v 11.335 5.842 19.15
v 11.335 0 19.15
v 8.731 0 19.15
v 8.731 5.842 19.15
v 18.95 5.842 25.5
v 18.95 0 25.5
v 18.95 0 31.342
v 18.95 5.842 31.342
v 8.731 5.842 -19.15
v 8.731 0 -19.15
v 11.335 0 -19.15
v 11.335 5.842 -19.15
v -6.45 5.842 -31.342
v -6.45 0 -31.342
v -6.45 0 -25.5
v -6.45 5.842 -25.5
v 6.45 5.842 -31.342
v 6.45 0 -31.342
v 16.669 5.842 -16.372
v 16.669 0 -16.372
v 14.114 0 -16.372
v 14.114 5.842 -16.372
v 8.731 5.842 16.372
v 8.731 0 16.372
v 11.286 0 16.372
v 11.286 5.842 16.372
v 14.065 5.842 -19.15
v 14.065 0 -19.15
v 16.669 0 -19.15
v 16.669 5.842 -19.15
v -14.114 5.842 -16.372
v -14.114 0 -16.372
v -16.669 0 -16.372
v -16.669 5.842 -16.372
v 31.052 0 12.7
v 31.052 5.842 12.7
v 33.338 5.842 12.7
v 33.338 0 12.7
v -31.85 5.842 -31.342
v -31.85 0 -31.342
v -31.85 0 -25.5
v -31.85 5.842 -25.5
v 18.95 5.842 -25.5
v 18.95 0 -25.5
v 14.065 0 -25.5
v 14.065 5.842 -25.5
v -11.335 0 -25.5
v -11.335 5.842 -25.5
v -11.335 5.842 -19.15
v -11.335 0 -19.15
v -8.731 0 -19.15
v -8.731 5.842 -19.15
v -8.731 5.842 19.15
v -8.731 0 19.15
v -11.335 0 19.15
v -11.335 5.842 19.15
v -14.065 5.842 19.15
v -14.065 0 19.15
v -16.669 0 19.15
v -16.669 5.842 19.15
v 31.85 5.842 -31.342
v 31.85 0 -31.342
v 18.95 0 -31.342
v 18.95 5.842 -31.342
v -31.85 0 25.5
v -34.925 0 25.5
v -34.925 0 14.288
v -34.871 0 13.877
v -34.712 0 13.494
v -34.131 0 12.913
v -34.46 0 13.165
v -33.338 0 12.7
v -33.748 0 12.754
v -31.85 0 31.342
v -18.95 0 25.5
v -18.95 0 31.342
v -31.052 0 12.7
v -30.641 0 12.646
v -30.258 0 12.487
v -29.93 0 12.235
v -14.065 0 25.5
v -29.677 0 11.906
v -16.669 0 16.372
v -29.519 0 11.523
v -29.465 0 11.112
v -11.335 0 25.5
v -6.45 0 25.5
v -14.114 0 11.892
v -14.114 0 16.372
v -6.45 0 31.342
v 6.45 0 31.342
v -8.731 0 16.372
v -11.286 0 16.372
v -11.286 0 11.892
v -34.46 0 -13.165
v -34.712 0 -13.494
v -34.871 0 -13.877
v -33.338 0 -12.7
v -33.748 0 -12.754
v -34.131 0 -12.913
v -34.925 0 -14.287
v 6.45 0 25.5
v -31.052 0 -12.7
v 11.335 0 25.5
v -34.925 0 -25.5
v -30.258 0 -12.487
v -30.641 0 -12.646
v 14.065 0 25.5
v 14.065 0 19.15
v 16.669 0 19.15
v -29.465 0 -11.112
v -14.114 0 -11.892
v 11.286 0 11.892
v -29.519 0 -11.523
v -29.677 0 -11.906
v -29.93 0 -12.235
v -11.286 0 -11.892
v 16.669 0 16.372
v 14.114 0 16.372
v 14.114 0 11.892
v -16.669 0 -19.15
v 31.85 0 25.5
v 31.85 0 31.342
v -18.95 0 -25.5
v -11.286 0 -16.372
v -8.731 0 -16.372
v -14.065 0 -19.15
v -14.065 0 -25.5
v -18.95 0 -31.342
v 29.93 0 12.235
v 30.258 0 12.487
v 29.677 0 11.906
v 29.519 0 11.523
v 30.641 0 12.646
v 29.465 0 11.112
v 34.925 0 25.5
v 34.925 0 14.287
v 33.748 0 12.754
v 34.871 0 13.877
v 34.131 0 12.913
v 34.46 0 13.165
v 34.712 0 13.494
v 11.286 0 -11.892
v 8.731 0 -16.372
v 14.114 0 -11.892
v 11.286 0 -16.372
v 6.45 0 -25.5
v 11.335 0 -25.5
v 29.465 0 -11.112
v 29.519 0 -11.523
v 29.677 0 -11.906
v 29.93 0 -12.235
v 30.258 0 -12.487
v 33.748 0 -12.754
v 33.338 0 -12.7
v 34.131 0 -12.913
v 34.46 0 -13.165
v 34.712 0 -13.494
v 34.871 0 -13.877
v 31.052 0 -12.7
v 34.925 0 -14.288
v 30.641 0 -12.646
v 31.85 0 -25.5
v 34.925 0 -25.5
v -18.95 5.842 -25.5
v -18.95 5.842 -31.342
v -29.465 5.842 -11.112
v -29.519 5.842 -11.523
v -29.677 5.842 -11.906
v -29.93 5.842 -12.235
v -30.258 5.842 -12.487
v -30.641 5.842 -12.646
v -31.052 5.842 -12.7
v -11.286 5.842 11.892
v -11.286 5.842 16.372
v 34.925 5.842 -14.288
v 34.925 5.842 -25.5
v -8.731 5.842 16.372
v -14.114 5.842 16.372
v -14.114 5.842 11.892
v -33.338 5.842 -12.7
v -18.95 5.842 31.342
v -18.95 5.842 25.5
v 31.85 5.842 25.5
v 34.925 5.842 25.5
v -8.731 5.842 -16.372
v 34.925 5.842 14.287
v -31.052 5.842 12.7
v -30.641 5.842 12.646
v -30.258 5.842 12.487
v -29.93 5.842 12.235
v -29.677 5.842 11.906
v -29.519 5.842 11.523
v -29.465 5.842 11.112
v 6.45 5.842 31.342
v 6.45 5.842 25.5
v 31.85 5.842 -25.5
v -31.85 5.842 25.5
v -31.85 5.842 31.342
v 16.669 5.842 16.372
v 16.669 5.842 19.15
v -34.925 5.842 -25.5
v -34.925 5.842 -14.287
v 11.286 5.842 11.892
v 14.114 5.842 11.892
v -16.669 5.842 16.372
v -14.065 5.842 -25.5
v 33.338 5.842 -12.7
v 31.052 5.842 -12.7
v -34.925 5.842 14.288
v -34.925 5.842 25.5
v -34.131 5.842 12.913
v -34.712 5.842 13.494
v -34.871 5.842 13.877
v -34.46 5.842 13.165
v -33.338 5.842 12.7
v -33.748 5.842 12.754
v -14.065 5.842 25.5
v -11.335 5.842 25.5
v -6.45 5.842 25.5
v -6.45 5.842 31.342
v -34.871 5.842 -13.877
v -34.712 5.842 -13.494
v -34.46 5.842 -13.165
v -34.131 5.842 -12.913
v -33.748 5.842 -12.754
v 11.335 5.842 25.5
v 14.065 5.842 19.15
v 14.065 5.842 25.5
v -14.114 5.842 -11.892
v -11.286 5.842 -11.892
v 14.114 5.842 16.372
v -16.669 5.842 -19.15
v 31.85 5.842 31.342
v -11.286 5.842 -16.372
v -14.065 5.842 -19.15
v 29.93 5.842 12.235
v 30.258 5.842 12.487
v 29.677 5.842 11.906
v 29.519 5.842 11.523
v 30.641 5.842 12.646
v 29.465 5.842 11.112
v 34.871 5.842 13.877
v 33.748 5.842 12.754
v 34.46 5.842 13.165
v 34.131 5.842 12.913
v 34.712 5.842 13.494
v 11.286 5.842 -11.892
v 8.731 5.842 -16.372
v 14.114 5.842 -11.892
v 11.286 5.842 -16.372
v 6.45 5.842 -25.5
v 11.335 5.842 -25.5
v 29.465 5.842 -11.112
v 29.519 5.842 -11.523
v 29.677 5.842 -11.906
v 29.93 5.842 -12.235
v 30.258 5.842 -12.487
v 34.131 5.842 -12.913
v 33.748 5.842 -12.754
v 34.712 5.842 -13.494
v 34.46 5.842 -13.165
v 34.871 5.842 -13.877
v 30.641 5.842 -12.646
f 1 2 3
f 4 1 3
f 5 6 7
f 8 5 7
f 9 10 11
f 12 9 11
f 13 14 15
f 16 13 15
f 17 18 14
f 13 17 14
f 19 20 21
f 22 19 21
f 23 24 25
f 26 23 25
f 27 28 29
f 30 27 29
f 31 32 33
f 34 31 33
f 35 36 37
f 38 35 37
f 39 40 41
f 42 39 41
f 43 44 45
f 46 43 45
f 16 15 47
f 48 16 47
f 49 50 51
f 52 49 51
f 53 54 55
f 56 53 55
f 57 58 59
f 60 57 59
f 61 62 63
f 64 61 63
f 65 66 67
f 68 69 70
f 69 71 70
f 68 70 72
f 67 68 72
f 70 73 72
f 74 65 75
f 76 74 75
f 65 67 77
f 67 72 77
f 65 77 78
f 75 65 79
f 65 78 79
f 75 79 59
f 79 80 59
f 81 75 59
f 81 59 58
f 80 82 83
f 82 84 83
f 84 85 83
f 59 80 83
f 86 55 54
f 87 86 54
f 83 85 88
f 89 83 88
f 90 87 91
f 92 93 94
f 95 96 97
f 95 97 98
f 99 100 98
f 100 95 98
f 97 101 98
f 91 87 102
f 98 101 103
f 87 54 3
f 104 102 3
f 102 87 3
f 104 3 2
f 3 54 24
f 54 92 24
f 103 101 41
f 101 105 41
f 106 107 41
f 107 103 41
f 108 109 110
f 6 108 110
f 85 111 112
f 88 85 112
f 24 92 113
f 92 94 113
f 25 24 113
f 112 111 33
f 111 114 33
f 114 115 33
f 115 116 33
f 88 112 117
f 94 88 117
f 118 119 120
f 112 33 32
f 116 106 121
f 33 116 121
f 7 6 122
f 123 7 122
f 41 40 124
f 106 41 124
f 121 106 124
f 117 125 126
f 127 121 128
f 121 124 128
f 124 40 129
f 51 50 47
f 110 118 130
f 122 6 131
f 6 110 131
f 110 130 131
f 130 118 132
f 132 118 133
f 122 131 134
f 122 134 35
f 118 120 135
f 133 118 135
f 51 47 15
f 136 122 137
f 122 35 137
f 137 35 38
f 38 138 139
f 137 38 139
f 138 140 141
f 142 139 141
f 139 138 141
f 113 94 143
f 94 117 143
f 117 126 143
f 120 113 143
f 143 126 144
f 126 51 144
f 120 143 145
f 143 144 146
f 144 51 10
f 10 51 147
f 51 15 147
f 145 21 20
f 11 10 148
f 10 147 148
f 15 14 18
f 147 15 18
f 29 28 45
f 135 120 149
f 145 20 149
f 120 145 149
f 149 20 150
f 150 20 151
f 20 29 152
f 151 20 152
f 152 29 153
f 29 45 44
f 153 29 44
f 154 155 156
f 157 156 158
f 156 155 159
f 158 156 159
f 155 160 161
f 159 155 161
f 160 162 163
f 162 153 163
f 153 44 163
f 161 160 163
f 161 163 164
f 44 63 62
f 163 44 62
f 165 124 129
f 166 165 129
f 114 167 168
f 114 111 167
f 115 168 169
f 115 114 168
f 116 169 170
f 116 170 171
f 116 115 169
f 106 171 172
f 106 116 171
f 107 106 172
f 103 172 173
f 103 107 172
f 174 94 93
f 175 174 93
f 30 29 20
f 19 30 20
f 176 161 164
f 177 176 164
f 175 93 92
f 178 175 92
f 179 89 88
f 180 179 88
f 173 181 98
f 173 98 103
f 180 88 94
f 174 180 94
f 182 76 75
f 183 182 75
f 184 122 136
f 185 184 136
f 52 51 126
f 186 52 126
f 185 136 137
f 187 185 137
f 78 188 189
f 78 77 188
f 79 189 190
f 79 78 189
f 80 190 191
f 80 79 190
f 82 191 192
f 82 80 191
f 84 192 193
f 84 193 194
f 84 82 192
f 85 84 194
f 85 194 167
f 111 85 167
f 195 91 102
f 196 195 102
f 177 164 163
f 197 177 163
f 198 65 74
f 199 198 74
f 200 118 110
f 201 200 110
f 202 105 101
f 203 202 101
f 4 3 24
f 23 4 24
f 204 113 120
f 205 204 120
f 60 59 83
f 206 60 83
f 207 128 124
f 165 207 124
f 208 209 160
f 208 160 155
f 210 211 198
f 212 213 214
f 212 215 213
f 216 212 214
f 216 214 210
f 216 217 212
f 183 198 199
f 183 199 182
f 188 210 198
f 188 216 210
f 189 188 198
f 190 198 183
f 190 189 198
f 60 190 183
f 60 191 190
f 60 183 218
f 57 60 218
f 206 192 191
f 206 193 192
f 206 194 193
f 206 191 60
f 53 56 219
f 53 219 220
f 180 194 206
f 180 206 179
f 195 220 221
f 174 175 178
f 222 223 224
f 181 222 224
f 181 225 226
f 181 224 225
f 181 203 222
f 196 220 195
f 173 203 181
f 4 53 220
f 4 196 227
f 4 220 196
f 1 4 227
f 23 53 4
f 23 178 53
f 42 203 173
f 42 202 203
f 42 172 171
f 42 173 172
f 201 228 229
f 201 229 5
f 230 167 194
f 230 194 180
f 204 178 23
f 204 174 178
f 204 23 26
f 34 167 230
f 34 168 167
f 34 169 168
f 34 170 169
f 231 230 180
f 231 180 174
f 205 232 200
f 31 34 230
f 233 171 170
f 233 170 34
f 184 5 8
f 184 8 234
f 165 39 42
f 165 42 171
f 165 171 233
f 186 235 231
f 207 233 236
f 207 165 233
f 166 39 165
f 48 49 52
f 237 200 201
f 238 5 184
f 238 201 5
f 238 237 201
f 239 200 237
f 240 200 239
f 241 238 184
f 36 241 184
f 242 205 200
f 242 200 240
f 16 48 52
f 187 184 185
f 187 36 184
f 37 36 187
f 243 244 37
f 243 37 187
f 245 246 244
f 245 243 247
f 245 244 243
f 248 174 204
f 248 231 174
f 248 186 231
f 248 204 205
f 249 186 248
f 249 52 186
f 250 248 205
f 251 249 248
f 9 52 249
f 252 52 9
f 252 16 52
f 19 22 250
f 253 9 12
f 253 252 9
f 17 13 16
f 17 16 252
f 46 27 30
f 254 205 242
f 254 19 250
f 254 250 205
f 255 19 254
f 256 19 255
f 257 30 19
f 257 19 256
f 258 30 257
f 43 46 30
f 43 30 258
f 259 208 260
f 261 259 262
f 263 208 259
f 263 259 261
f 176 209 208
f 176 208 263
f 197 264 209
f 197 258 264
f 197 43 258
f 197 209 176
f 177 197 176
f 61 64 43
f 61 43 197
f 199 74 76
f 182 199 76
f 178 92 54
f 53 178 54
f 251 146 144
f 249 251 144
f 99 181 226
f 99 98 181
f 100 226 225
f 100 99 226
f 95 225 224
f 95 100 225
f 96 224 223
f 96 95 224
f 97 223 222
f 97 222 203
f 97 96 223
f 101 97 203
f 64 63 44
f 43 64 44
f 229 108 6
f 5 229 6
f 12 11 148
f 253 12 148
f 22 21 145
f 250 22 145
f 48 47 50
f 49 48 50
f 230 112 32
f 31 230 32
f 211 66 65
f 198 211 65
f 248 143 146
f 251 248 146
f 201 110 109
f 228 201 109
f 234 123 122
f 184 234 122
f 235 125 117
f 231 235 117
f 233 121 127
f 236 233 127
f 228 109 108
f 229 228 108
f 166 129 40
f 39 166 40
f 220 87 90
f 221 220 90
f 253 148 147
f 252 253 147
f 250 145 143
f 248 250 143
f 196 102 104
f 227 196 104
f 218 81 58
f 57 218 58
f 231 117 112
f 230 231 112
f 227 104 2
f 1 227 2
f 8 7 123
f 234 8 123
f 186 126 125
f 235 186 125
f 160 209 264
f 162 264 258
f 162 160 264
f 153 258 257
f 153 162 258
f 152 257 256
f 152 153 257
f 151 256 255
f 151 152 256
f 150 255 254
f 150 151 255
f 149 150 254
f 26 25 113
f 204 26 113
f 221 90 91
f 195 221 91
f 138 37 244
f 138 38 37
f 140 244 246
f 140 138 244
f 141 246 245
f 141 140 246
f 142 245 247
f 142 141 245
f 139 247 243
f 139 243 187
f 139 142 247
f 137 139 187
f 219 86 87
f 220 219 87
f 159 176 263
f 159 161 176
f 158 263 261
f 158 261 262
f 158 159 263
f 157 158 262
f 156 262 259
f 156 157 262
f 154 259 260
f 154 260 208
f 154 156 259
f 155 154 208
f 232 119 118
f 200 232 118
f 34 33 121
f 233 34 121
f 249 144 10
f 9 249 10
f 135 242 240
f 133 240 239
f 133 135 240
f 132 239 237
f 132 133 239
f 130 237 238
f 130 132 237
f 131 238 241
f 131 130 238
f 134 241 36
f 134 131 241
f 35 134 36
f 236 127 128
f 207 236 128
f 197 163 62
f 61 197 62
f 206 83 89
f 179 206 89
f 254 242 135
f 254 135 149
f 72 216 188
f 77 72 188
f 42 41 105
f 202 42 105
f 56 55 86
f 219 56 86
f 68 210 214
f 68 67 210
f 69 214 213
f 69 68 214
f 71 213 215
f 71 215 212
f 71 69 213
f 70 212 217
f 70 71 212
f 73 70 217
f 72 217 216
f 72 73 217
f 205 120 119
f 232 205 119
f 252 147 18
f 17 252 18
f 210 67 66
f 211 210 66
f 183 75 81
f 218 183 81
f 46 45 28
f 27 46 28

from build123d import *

# Parameters (mm, degrees)
BOSS_EXTRUDE1_DEPTH = 5.842
SKETCH2_W           = 5.460302537
SKETCH2_H           = 25.4
CUT_EXTRUDE1_DEPTH  = 48.288535112
FILLET2_R           = 1.5875


with BuildPart() as part:
    # Sketch1 → Boss-Extrude1 (new body)
    with BuildSketch(Plane(origin=(0, 0, 0), x_dir=(1, 0, 0), z_dir=(0, 1, 0))):
        Polygon((-6.45, 31.342), (-6.45, 25.5), (-11.335313542, 25.5), (-11.335313542, 19.15), (-8.73125, 19.15), (-8.73125, 16.371875), (-11.286067573, 16.371875), (-11.286067573, 11.892), (-14.113932427, 11.892), (-14.113932427, 16.371875), (-16.66875, 16.371875), (-16.66875, 19.15), (-14.064686458, 19.15), (-14.064686458, 25.5), (-18.95, 25.5), (-18.95, 31.342), (-31.85, 31.342), (-31.85, 25.5), (-34.925, 25.5), (-34.925, -25.5), (-31.85, -25.5), (-31.85, -31.342), (-18.95, -31.342), (-18.95, -25.5), (-14.064686458, -25.5), (-14.064686458, -19.15), (-16.66875, -19.15), (-16.66875, -16.371875), (-14.113932427, -16.371875), (-14.113932427, -11.892), (-11.286067573, -11.892), (-11.286067573, -16.371875), (-8.73125, -16.371875), (-8.73125, -19.15), (-11.335313542, -19.15), (-11.335313542, -25.5), (-6.45, -25.5), (-6.45, -31.342), (6.45, -31.342), (6.45, -25.5), (11.335313542, -25.5), (11.335313542, -19.15), (8.73125, -19.15), (8.73125, -16.371875), (11.286067573, -16.371875), (11.286067573, -11.892), (14.113932427, -11.892), (14.113932427, -16.371875), (16.66875, -16.371875), (16.66875, -19.15), (14.064686458, -19.15), (14.064686458, -25.5), (18.95, -25.5), (18.95, -31.342), (31.85, -31.342), (31.85, -25.5), (34.925, -25.5), (34.925, 25.5), (31.85, 25.5), (31.85, 31.342), (18.95, 31.342), (18.95, 25.5), (14.064686458, 25.5), (14.064686458, 19.15), (16.66875, 19.15), (16.66875, 16.371875), (14.113932427, 16.371875), (14.113932427, 11.892), (11.286067573, 11.892), (11.286067573, 16.371875), (8.73125, 16.371875), (8.73125, 19.15), (11.335313542, 19.15), (11.335313542, 25.5), (6.45, 25.5), (6.45, 31.342), align=None)
    extrude(amount=BOSS_EXTRUDE1_DEPTH)

    # Sketch2 → Cut-Extrude1 (cut, through all)
    with BuildSketch(Plane(origin=(0, 5.842, 0), x_dir=(1, 0, 0), z_dir=(0, 1, 0))):
        with Locations((-32.194848732, 0)):
            Rectangle(SKETCH2_W, SKETCH2_H)
        with Locations((32.194848732, 0)):
            Rectangle(SKETCH2_W, SKETCH2_H)
    extrude(amount=-CUT_EXTRUDE1_DEPTH, mode=Mode.SUBTRACT)

    # Fillet2
    fillet2_edges = [part.edges().sort_by_distance(p)[0] for p in [
        (-34.925, 2.921, -12.7),
        (-29.464697463, 2.921, -12.7),
        (-29.464697463, 2.921, 12.7),
        (-34.925, 2.921, 12.7),
        (29.464697463, 2.921, -12.7),
        (34.925, 2.921, -12.7),
        (34.925, 2.921, 12.7),
        (29.464697463, 2.921, 12.7),
    ]]
    fillet(fillet2_edges, radius=FILLET2_R)


solid = part.part
